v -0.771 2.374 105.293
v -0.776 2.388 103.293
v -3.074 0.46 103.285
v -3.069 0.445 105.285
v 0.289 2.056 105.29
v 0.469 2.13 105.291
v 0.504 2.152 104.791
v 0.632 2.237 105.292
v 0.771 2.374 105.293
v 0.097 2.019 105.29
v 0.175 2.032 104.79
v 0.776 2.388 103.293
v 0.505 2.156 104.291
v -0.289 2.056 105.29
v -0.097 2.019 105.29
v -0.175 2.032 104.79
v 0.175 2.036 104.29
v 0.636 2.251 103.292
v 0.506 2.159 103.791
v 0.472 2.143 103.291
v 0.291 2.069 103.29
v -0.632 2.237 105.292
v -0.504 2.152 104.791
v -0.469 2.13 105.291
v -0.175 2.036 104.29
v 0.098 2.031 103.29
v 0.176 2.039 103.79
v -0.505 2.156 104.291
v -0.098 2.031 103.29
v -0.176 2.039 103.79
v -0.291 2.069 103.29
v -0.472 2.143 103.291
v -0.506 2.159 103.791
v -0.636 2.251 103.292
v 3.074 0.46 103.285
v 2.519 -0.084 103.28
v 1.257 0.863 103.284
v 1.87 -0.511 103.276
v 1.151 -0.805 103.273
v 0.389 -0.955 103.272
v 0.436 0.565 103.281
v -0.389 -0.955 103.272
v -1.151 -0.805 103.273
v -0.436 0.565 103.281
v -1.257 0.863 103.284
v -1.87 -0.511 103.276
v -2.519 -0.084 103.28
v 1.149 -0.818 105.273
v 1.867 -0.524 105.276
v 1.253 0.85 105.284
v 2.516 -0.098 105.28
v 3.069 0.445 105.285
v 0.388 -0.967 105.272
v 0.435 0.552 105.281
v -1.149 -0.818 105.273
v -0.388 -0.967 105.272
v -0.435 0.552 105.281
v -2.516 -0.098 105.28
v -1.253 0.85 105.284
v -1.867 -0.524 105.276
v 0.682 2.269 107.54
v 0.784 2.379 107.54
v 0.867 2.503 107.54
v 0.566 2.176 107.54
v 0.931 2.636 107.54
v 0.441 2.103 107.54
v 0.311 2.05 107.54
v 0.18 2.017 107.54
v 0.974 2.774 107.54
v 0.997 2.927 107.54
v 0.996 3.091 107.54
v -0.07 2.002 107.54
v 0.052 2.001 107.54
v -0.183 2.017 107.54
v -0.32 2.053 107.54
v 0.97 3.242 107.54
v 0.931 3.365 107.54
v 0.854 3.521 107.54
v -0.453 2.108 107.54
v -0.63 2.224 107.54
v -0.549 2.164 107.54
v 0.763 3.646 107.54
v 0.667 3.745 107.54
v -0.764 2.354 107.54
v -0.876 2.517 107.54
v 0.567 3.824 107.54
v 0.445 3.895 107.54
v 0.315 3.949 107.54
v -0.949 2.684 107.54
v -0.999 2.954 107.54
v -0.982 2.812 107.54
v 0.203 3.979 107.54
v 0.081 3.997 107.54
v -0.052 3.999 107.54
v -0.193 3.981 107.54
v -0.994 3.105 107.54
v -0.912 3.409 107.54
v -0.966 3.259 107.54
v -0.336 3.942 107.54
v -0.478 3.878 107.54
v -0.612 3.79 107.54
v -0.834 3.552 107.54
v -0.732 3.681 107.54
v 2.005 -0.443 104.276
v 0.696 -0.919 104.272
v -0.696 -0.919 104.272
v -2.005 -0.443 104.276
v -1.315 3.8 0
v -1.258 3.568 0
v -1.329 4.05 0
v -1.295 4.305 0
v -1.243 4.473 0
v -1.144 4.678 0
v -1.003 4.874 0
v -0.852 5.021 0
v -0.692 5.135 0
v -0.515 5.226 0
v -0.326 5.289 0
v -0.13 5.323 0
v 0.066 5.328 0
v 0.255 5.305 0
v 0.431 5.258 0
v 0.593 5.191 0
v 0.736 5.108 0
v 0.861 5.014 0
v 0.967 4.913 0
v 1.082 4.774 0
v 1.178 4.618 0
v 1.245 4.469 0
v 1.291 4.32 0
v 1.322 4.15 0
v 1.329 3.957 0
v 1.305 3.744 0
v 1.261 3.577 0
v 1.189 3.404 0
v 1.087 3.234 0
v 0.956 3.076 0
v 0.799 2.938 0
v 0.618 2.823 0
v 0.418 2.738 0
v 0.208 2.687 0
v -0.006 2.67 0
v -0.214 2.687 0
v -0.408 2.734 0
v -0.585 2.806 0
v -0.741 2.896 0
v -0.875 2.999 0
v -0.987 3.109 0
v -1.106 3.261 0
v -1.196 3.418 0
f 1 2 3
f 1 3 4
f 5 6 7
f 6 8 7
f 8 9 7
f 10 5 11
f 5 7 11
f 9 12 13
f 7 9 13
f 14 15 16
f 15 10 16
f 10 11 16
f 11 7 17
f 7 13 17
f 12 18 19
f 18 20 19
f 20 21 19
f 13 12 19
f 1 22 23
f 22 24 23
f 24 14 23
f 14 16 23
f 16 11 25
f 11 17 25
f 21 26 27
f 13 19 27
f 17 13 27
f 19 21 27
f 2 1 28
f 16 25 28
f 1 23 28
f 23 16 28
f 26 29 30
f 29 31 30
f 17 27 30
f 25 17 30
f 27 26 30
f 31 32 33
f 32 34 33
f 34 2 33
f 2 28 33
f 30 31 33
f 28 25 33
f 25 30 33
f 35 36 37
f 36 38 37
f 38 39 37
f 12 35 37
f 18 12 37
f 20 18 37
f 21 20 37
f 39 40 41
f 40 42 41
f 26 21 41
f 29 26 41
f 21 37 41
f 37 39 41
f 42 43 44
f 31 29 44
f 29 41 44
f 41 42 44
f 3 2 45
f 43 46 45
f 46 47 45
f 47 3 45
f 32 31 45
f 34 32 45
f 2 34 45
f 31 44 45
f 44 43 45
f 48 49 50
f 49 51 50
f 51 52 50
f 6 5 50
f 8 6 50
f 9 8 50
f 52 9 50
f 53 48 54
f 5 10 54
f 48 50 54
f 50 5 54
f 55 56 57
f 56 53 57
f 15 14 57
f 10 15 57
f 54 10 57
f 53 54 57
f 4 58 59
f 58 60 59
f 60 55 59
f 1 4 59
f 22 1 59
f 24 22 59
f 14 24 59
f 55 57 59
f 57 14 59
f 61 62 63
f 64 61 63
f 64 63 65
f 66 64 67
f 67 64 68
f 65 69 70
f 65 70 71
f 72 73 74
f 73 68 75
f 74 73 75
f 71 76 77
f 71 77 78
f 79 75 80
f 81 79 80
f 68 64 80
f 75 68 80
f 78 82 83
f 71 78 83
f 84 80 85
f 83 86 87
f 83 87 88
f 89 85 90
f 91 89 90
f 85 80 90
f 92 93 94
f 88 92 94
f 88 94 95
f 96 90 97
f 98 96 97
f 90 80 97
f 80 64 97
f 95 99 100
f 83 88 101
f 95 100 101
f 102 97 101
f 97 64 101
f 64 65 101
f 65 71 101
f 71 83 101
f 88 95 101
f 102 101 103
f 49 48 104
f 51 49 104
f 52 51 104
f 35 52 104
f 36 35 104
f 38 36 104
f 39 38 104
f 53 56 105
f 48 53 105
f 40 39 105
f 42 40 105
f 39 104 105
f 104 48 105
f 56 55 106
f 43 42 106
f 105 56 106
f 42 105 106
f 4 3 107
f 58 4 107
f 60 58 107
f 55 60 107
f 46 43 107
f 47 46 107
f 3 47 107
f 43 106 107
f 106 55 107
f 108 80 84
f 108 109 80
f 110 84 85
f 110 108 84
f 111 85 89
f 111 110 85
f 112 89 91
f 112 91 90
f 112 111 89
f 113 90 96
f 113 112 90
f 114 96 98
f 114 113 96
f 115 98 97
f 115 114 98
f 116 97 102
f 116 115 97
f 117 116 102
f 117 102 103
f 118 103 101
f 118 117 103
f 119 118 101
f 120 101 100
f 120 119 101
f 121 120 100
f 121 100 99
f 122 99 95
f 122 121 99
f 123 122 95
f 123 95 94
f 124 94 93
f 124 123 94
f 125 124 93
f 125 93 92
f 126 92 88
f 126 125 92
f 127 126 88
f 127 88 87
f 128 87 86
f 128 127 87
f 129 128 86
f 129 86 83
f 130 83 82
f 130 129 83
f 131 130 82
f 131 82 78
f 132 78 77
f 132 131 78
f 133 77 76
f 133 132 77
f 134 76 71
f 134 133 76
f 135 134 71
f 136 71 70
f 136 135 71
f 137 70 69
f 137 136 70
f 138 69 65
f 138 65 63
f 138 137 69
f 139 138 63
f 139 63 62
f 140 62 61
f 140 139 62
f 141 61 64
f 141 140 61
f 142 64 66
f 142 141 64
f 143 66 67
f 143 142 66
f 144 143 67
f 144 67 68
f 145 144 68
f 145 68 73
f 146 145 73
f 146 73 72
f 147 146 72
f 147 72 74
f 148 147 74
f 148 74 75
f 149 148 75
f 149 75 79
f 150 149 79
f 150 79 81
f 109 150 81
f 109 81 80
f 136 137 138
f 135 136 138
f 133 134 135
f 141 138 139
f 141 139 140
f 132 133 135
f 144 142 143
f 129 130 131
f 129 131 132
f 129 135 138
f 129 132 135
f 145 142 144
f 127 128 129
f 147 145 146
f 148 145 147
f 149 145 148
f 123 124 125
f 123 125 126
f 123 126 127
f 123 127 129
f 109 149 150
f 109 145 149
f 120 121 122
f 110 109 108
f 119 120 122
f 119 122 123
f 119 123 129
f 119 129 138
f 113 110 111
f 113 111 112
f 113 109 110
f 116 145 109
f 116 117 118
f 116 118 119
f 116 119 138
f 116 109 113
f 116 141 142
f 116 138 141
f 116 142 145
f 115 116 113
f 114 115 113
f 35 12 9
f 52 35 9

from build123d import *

# Parameters (mm, degrees)
REVOLVE_1_ANGLE = 100


with BuildPart() as part:
    # 放样1: read off the stored shape, not the designer's step
    # 放样1: loft between two sections, ruled curve by curve
    loft_1_from = [
        Edge.make_bspline([(-0.630133871, 2.223513487, 107.54), (-0.694841081, 2.276024643, 107.54), (-0.761652519, 2.343293659, 107.54), (-0.883036961, 2.518727204, 107.54), (-0.937584486, 2.627557912, 107.54), (-1.002413523, 2.886224313, 107.54), (-1.011566009, 3.036607803, 107.54), (-0.951771481, 3.344582311, 107.54), (-0.881508825, 3.500719452, 107.54), (-0.671464201, 3.75954829, 107.54), (-0.533135829, 3.860448783, 107.54), (-0.244067314, 3.982363002, 107.54), (-0.095020748, 4.004364891, 107.54), (0.171451127, 3.994174174, 107.54), (0.289180076, 3.963199181, 107.54), (0.48584451, 3.880529892, 107.54), (0.565426662, 3.828997669, 107.54), (0.694841081, 3.723975357, 107.54), (0.761652519, 3.656706341, 107.54), (0.883036961, 3.481272796, 107.54), (0.937584486, 3.372442088, 107.54), (1.002413523, 3.113775687, 107.54), (1.011566009, 2.963392197, 107.54), (0.951771481, 2.655417689, 107.54), (0.881508825, 2.499280548, 107.54), (0.671464201, 2.24045171, 107.54), (0.533135829, 2.139551217, 107.54), (0.244067314, 2.017636998, 107.54), (0.095020748, 1.995635109, 107.54), (-0.171451127, 2.005825826, 107.54), (-0.289180076, 2.036800819, 107.54), (-0.48584451, 2.119470108, 107.54), (-0.565426662, 2.171002331, 107.54), (-0.630133871, 2.223513487, 107.54)], [0, 0, 0, 0, 0.0625, 0.0625, 0.125, 0.125, 0.1875, 0.1875, 0.25, 0.25, 0.3125, 0.3125, 0.375, 0.375, 0.4375, 0.4375, 0.5, 0.5, 0.5625, 0.5625, 0.625, 0.625, 0.6875, 0.6875, 0.75, 0.75, 0.8125, 0.8125, 0.875, 0.875, 0.9375, 0.9375, 1, 1, 1, 1], 3),
    ]
    loft_1_to = [
        Edge.make_bspline([(-1.257751162, 3.567608956, 0), (-1.293783749, 3.672421553, 0), (-1.321798599, 3.795367125, 0), (-1.335222616, 4.078782721, 0), (-1.320133937, 4.239986455, 0), (-1.211137174, 4.577489269, 0), (-1.115569475, 4.753611411, 0), (-0.831239343, 5.058993186, 0), (-0.642016238, 5.185685988, 0), (-0.22276585, 5.329816336, 0), (0.004360045, 5.34625644, 0), (0.416362735, 5.28026071, 0), (0.600024499, 5.200132373, 0), (0.893508107, 5.000994692, 0), (1.004529945, 4.883145367, 0), (1.168213301, 4.651386088, 0), (1.221718575, 4.537203641, 0), (1.293783749, 4.327578447, 0), (1.321798599, 4.204632875, 0), (1.335222616, 3.921217279, 0), (1.320133937, 3.760013545, 0), (1.211137174, 3.422510731, 0), (1.115569475, 3.246388589, 0), (0.831239343, 2.941006814, 0), (0.642016238, 2.814314012, 0), (0.22276585, 2.670183664, 0), (-0.004360045, 2.65374356, 0), (-0.416362735, 2.71973929, 0), (-0.600024499, 2.799867627, 0), (-0.893508107, 2.999005308, 0), (-1.004529945, 3.116854633, 0), (-1.168213301, 3.348613912, 0), (-1.221718575, 3.462796359, 0), (-1.257751162, 3.567608956, 0)], [0, 0, 0, 0, 0.0625, 0.0625, 0.125, 0.125, 0.1875, 0.1875, 0.25, 0.25, 0.3125, 0.3125, 0.375, 0.375, 0.4375, 0.4375, 0.5, 0.5, 0.5625, 0.5625, 0.625, 0.625, 0.6875, 0.6875, 0.75, 0.75, 0.8125, 0.8125, 0.875, 0.875, 0.9375, 0.9375, 1, 1, 1, 1], 3),
    ]
    loft_1 = Solid(Shell([*[Face.make_surface_from_curves(loft_1_from[k], loft_1_to[k]) for k in range(1)], Face(Wire(loft_1_from)), Face(Wire(loft_1_to))]))
    add(loft_1)


with BuildPart() as body_2:
    # 草图7 → 旋转1 (revolve, symmetric)
    with BuildSketch(Plane(origin=(0, 0, 0), x_dir=(0, 0, -1), z_dir=(1, 0, 0))) as revolve_1_sk:
        Polygon((-105.290043667, 2.014017768), (-103.290082481, 2.026478006), (-103.271391762, -0.973521994), (-105.271352947, -0.985982232), align=None)
    revolve(axis=Axis((0, 4, 0), (0, -0.009298463533136264, 0.9999567683534739)), revolution_arc=REVOLVE_1_ANGLE / 2)
    revolve(revolve_1_sk.sketch, axis=Axis((0, 4, 0), (0, 0.009298463533136264, -0.9999567683534739)), revolution_arc=REVOLVE_1_ANGLE / 2)


solid = Compound([part.part, body_2.part])
